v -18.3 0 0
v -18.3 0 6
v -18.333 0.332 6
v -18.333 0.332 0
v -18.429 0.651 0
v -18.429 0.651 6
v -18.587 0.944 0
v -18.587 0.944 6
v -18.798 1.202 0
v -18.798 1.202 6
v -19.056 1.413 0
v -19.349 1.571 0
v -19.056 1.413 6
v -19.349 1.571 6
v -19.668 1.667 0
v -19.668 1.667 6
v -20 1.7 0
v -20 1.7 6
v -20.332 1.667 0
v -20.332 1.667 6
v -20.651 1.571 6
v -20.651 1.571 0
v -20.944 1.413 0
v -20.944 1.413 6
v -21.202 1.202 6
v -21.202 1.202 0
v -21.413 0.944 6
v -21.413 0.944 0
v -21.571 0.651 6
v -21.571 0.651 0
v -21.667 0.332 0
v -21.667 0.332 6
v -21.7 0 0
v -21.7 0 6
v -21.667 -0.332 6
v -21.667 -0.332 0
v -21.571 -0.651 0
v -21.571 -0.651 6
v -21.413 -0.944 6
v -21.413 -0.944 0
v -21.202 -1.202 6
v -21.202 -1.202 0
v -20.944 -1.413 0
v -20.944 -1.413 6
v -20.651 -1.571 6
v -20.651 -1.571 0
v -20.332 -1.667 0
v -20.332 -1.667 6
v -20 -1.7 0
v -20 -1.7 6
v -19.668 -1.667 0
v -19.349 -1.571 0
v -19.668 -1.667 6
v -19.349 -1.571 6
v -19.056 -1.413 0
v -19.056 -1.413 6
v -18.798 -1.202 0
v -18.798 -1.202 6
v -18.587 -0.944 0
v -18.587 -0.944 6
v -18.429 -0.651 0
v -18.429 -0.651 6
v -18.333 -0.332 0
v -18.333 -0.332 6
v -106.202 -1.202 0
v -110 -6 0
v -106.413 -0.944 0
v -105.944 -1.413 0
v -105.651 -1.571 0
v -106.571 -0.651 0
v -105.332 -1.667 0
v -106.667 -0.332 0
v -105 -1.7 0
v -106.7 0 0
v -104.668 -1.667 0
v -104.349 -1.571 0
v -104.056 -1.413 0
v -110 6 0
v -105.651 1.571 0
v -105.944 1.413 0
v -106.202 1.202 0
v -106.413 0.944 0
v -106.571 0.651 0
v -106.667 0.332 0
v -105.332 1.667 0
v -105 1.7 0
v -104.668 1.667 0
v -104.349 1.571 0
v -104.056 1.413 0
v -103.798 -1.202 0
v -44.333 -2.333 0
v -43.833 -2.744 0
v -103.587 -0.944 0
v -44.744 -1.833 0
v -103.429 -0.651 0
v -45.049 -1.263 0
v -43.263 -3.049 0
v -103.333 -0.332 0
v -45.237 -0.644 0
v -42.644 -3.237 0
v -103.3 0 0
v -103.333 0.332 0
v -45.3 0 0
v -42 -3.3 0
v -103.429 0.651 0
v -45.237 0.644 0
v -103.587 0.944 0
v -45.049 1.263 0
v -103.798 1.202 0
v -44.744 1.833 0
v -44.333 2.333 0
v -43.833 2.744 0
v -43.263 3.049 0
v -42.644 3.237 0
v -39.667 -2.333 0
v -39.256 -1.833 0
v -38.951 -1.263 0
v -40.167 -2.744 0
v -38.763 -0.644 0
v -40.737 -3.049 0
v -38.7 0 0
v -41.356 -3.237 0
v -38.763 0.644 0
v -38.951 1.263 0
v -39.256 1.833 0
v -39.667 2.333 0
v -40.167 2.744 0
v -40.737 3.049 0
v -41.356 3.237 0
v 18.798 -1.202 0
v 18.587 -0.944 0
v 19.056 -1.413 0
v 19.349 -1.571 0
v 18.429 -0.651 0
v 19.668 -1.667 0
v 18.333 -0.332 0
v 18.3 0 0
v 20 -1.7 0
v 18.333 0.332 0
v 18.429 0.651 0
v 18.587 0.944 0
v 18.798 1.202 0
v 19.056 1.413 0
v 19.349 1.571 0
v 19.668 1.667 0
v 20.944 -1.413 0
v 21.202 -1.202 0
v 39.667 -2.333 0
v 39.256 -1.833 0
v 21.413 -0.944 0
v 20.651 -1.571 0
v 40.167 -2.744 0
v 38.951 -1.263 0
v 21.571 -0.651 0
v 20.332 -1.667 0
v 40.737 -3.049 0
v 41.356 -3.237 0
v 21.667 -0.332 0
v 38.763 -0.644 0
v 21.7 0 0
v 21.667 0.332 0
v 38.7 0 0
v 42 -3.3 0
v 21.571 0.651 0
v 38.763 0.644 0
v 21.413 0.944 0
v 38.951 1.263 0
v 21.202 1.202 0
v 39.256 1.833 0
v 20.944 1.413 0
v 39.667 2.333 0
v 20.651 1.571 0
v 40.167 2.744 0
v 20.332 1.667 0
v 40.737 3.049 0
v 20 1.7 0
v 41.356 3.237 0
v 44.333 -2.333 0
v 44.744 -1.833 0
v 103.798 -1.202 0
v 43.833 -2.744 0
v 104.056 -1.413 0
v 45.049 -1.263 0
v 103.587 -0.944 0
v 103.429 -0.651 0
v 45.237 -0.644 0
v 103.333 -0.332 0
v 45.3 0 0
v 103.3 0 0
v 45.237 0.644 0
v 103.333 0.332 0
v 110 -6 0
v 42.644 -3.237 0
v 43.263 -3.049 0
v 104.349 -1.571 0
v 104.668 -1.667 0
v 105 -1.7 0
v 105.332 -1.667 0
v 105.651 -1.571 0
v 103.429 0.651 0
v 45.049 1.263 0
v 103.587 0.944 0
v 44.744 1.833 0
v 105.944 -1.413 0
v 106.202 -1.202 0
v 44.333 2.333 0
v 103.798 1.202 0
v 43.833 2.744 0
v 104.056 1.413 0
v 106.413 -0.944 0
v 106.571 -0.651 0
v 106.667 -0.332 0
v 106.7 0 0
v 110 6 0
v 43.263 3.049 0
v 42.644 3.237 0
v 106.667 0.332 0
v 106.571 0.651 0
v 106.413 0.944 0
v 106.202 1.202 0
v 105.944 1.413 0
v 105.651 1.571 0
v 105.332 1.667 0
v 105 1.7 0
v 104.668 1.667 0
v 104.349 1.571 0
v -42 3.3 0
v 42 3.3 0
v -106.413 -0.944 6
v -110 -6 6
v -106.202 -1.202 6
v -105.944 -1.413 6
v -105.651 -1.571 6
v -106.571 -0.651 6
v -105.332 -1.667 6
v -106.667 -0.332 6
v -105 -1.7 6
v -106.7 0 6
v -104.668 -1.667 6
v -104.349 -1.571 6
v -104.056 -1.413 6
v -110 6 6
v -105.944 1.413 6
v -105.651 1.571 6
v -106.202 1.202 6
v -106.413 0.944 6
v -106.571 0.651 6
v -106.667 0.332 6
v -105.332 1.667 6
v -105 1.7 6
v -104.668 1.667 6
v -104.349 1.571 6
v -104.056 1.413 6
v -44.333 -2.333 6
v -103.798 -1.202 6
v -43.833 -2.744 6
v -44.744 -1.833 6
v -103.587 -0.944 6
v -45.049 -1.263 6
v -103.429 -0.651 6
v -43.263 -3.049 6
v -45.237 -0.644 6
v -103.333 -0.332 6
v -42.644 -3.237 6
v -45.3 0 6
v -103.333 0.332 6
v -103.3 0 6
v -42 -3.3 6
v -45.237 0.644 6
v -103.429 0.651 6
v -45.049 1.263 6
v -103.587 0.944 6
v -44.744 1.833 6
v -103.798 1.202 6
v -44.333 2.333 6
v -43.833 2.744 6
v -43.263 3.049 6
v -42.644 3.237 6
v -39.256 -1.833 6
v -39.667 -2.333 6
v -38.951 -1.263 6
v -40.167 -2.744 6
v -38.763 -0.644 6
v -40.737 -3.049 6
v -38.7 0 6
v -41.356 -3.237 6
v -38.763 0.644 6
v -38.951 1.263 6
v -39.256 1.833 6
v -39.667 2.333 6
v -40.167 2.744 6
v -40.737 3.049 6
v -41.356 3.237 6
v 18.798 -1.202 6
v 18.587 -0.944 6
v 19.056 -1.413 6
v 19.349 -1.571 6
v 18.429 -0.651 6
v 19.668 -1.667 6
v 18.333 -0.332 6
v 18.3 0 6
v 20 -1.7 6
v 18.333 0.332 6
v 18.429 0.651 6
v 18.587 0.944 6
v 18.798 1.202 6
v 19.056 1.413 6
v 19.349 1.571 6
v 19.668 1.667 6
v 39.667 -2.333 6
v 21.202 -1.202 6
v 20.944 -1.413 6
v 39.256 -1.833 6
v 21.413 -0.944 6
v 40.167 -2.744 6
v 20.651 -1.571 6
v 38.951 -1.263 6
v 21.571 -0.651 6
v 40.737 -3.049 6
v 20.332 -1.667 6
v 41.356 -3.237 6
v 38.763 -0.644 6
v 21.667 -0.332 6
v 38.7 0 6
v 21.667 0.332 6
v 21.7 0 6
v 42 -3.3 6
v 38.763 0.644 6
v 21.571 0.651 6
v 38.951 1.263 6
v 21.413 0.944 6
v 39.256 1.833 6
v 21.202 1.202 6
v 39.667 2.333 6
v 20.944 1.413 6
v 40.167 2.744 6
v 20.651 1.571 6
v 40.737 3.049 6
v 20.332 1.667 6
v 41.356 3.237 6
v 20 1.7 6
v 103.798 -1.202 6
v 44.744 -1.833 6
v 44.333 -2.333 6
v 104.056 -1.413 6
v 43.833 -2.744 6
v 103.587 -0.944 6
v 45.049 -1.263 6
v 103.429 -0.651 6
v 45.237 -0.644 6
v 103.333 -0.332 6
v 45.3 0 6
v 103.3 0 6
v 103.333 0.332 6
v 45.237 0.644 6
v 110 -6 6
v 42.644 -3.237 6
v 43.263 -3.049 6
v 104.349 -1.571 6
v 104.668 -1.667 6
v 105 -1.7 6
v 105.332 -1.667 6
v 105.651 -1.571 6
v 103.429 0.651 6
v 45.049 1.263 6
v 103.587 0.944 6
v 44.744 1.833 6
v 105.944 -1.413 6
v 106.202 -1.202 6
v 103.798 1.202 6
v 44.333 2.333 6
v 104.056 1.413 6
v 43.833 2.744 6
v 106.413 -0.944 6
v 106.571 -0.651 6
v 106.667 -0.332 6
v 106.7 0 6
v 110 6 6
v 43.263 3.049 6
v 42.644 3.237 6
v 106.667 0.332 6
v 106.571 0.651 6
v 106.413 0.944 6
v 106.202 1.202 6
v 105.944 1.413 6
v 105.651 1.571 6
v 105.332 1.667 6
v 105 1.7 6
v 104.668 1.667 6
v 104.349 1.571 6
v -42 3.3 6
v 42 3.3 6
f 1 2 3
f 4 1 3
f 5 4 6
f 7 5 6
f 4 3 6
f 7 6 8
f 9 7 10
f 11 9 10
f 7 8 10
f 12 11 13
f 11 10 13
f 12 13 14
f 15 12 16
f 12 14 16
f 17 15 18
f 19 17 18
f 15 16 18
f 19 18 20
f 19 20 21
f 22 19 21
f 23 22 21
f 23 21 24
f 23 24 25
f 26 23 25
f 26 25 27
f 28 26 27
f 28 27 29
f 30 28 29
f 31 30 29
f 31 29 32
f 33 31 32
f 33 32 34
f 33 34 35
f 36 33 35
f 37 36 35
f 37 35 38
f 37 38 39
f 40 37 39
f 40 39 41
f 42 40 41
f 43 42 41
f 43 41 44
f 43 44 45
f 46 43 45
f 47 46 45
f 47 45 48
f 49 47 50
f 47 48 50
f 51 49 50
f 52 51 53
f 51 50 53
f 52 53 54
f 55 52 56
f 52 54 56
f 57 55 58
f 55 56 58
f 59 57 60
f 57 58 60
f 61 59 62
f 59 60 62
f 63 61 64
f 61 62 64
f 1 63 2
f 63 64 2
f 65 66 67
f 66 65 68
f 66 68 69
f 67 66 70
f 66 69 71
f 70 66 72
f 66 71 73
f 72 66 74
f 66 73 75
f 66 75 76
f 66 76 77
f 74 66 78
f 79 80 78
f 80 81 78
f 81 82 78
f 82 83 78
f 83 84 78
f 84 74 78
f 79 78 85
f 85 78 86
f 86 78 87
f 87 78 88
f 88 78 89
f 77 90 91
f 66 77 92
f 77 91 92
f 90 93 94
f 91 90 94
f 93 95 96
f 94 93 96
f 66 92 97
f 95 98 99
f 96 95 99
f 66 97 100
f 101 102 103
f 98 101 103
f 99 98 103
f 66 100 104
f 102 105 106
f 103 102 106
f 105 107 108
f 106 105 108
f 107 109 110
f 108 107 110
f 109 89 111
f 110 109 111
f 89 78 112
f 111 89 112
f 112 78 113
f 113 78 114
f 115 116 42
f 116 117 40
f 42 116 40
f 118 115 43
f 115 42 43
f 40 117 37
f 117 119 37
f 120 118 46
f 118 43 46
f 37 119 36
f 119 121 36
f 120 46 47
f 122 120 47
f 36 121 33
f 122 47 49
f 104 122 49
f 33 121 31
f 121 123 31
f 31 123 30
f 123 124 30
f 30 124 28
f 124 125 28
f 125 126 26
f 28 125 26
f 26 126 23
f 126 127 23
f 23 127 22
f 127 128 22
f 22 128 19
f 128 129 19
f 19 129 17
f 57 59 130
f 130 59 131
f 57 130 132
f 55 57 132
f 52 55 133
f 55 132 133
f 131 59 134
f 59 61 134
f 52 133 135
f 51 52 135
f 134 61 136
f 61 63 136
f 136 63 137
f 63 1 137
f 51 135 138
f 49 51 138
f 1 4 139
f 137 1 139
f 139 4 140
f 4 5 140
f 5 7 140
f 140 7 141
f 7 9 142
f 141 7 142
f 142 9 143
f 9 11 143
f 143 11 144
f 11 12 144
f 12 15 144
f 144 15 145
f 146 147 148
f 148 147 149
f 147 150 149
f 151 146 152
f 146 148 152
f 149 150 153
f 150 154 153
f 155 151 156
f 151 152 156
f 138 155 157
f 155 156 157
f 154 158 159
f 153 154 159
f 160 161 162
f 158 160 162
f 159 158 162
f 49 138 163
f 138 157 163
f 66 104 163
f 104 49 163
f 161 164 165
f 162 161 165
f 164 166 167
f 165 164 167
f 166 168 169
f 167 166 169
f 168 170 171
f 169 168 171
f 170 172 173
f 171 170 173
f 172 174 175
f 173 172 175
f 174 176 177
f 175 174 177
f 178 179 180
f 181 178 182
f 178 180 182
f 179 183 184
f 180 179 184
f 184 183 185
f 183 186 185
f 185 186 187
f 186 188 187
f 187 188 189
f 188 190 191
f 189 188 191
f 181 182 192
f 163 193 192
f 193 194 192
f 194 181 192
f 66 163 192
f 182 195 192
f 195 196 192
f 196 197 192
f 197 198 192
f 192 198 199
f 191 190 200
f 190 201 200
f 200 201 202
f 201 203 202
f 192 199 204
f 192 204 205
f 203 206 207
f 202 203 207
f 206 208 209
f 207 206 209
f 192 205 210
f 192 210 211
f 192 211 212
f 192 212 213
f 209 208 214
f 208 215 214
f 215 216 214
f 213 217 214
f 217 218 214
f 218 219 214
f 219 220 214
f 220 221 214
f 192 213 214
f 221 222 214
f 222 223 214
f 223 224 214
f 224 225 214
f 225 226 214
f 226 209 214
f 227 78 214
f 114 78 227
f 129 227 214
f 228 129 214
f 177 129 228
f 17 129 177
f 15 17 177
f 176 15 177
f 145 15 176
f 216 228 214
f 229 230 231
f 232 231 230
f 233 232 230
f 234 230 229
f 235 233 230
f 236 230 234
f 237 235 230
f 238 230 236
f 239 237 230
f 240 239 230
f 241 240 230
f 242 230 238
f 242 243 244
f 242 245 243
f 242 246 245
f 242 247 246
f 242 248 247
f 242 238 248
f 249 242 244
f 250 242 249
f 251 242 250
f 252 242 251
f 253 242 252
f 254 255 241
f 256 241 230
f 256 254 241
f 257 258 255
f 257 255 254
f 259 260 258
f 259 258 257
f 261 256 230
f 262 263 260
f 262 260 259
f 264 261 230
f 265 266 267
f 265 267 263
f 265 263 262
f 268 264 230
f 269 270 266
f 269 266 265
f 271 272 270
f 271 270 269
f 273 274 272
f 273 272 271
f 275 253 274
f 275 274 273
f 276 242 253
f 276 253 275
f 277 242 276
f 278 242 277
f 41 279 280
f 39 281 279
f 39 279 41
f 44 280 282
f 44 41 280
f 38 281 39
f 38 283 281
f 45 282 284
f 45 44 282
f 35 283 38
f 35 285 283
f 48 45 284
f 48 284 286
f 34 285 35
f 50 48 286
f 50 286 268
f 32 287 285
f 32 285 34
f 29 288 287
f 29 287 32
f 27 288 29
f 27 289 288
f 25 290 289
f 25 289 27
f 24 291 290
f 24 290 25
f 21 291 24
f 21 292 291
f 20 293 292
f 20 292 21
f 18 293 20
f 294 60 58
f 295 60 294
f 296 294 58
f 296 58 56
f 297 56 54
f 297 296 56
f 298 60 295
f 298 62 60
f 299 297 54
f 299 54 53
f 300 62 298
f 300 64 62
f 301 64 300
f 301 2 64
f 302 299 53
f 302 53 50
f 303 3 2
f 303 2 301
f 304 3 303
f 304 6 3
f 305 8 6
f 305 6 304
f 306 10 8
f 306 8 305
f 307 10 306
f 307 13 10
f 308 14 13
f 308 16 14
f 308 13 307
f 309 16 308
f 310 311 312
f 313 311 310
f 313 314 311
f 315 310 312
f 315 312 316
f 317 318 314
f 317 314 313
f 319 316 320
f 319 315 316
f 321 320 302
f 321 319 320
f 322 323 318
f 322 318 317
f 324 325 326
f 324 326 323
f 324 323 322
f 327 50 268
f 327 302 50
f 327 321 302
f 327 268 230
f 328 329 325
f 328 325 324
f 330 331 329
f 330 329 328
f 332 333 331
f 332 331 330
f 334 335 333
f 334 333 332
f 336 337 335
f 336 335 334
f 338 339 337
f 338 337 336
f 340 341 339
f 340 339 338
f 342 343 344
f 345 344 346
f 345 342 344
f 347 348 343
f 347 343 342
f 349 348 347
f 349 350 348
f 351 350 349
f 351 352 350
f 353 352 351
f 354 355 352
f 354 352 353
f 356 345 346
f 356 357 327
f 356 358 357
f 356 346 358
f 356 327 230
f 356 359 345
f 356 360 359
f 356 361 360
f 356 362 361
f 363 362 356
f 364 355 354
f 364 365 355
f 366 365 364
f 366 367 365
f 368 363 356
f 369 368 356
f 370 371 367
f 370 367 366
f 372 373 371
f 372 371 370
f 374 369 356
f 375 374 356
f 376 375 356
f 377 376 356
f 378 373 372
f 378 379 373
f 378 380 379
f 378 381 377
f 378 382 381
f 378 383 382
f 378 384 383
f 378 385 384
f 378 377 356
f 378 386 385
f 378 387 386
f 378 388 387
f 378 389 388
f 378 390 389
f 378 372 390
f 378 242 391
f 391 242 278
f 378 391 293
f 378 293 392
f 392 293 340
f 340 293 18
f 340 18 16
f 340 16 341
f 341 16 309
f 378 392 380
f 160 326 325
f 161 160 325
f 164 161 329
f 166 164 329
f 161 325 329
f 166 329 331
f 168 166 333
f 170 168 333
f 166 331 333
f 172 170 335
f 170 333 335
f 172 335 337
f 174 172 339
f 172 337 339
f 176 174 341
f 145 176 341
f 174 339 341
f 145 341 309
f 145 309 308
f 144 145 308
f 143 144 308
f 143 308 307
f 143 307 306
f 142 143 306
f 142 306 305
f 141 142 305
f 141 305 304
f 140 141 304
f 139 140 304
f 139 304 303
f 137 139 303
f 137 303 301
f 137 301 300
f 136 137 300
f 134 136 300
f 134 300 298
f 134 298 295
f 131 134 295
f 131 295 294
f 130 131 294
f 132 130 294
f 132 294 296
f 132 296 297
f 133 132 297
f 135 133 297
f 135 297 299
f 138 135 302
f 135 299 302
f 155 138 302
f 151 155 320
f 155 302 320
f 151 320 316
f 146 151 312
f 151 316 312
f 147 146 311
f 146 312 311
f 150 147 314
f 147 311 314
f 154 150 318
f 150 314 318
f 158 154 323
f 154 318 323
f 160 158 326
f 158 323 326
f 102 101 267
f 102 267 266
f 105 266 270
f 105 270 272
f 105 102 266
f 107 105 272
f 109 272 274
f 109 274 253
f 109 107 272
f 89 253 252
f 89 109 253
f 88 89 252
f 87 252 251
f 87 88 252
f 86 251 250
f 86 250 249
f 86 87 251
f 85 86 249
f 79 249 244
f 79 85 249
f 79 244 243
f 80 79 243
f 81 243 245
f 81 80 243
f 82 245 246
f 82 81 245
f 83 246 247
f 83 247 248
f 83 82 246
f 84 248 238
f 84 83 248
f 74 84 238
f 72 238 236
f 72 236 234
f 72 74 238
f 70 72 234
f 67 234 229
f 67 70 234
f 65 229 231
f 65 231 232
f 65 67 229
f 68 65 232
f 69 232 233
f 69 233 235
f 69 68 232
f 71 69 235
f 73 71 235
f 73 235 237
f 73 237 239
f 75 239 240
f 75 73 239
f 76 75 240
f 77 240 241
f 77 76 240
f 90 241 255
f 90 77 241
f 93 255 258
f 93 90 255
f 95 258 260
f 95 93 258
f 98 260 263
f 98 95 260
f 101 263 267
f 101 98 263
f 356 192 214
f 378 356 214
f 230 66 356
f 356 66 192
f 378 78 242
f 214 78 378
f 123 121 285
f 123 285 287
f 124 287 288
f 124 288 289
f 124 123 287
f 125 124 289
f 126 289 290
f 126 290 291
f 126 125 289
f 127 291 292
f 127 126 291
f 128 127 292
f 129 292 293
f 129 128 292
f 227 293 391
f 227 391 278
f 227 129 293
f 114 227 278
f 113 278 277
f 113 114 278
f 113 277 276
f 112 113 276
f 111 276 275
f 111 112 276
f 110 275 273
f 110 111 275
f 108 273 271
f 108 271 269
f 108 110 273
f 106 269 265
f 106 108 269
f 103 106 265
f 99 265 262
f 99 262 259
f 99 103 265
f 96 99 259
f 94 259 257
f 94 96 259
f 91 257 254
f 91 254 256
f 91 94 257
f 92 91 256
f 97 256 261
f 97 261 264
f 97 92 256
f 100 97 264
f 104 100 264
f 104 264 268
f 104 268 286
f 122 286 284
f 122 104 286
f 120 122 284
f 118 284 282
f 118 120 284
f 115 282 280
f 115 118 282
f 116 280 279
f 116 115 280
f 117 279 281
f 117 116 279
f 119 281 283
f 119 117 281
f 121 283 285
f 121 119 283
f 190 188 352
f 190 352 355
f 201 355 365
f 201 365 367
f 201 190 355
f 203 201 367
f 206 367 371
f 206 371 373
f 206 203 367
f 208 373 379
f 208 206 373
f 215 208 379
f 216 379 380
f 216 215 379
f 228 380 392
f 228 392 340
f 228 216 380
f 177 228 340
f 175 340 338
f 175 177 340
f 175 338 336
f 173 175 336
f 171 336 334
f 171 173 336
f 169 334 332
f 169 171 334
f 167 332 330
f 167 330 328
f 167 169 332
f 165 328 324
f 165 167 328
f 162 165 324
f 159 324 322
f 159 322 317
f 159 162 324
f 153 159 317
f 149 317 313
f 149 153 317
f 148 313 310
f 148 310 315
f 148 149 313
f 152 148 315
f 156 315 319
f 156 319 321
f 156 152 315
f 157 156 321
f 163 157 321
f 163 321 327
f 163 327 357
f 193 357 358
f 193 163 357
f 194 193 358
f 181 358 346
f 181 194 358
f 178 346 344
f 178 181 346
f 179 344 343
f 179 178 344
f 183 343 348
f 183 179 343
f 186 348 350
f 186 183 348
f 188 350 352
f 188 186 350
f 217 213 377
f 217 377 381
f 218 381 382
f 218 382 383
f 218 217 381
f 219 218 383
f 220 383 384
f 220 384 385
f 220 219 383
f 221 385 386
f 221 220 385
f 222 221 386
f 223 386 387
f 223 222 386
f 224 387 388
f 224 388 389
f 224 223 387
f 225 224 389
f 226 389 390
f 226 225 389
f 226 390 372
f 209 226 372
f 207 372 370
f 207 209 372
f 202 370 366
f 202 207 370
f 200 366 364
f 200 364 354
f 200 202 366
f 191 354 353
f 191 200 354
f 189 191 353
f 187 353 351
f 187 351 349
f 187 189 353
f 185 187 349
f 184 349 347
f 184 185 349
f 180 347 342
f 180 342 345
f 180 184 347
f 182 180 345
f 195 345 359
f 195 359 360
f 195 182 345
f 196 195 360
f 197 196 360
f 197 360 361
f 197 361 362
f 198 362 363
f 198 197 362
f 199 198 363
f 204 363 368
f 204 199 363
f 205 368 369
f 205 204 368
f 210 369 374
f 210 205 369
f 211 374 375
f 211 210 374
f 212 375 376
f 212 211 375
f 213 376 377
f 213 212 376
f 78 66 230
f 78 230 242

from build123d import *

# Parameters (mm, degrees)
SKETCH1_W                                     = 220
SKETCH1_H                                     = 12
SKETCH1_R                                     = 1.7
SKETCH1_R_2                                   = 3.3
HEADER_CROSSBEAM_DEPTH                        = 6
SKETCH2_R                                     = 1.7
BENCH_HEADER_M3_CLEARANCE_HOLES_2X_D3P4_DEPTH = 6.5


with BuildPart() as part:
    # Sketch1 → Header_Crossbeam (new body)
    with BuildSketch(Plane.XY):
        Rectangle(SKETCH1_W, SKETCH1_H)
        with Locations((-105, 0)):
            Circle(SKETCH1_R, mode=Mode.SUBTRACT)
        with Locations((105, 0)):
            Circle(SKETCH1_R, mode=Mode.SUBTRACT)
        with Locations((-42, 0)):
            Circle(SKETCH1_R_2, mode=Mode.SUBTRACT)
        with Locations((42, 0)):
            Circle(SKETCH1_R_2, mode=Mode.SUBTRACT)
    extrude(amount=HEADER_CROSSBEAM_DEPTH)

    # Sketch2 → Bench_Header_M3_Clearance_Holes_2x_D3p4 (cut)
    with BuildSketch(Plane.XY.offset(6)):
        with Locations((-20, 0)):
            Circle(SKETCH2_R)
        with Locations((20, 0)):
            Circle(SKETCH2_R)
    extrude(amount=-BENCH_HEADER_M3_CLEARANCE_HOLES_2X_D3P4_DEPTH, mode=Mode.SUBTRACT)


solid = part.part
